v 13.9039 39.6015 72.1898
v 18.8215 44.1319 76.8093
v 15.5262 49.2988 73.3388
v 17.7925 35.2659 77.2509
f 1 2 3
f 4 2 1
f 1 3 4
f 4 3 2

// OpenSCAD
// Auto-generated auxetic polyhedron
points = [
    [15.526195, 49.298849, 73.338822],
    [18.821493, 44.131870, 76.809289],
    [13.903940, 39.601526, 72.189839],
    [17.792485, 35.265860, 77.250916],
];

faces = [
    [0, 1, 2],
    [2, 1, 3],
    [3, 0, 2],
    [1, 0, 3],
];

polyhedron(points = points, faces = faces);
